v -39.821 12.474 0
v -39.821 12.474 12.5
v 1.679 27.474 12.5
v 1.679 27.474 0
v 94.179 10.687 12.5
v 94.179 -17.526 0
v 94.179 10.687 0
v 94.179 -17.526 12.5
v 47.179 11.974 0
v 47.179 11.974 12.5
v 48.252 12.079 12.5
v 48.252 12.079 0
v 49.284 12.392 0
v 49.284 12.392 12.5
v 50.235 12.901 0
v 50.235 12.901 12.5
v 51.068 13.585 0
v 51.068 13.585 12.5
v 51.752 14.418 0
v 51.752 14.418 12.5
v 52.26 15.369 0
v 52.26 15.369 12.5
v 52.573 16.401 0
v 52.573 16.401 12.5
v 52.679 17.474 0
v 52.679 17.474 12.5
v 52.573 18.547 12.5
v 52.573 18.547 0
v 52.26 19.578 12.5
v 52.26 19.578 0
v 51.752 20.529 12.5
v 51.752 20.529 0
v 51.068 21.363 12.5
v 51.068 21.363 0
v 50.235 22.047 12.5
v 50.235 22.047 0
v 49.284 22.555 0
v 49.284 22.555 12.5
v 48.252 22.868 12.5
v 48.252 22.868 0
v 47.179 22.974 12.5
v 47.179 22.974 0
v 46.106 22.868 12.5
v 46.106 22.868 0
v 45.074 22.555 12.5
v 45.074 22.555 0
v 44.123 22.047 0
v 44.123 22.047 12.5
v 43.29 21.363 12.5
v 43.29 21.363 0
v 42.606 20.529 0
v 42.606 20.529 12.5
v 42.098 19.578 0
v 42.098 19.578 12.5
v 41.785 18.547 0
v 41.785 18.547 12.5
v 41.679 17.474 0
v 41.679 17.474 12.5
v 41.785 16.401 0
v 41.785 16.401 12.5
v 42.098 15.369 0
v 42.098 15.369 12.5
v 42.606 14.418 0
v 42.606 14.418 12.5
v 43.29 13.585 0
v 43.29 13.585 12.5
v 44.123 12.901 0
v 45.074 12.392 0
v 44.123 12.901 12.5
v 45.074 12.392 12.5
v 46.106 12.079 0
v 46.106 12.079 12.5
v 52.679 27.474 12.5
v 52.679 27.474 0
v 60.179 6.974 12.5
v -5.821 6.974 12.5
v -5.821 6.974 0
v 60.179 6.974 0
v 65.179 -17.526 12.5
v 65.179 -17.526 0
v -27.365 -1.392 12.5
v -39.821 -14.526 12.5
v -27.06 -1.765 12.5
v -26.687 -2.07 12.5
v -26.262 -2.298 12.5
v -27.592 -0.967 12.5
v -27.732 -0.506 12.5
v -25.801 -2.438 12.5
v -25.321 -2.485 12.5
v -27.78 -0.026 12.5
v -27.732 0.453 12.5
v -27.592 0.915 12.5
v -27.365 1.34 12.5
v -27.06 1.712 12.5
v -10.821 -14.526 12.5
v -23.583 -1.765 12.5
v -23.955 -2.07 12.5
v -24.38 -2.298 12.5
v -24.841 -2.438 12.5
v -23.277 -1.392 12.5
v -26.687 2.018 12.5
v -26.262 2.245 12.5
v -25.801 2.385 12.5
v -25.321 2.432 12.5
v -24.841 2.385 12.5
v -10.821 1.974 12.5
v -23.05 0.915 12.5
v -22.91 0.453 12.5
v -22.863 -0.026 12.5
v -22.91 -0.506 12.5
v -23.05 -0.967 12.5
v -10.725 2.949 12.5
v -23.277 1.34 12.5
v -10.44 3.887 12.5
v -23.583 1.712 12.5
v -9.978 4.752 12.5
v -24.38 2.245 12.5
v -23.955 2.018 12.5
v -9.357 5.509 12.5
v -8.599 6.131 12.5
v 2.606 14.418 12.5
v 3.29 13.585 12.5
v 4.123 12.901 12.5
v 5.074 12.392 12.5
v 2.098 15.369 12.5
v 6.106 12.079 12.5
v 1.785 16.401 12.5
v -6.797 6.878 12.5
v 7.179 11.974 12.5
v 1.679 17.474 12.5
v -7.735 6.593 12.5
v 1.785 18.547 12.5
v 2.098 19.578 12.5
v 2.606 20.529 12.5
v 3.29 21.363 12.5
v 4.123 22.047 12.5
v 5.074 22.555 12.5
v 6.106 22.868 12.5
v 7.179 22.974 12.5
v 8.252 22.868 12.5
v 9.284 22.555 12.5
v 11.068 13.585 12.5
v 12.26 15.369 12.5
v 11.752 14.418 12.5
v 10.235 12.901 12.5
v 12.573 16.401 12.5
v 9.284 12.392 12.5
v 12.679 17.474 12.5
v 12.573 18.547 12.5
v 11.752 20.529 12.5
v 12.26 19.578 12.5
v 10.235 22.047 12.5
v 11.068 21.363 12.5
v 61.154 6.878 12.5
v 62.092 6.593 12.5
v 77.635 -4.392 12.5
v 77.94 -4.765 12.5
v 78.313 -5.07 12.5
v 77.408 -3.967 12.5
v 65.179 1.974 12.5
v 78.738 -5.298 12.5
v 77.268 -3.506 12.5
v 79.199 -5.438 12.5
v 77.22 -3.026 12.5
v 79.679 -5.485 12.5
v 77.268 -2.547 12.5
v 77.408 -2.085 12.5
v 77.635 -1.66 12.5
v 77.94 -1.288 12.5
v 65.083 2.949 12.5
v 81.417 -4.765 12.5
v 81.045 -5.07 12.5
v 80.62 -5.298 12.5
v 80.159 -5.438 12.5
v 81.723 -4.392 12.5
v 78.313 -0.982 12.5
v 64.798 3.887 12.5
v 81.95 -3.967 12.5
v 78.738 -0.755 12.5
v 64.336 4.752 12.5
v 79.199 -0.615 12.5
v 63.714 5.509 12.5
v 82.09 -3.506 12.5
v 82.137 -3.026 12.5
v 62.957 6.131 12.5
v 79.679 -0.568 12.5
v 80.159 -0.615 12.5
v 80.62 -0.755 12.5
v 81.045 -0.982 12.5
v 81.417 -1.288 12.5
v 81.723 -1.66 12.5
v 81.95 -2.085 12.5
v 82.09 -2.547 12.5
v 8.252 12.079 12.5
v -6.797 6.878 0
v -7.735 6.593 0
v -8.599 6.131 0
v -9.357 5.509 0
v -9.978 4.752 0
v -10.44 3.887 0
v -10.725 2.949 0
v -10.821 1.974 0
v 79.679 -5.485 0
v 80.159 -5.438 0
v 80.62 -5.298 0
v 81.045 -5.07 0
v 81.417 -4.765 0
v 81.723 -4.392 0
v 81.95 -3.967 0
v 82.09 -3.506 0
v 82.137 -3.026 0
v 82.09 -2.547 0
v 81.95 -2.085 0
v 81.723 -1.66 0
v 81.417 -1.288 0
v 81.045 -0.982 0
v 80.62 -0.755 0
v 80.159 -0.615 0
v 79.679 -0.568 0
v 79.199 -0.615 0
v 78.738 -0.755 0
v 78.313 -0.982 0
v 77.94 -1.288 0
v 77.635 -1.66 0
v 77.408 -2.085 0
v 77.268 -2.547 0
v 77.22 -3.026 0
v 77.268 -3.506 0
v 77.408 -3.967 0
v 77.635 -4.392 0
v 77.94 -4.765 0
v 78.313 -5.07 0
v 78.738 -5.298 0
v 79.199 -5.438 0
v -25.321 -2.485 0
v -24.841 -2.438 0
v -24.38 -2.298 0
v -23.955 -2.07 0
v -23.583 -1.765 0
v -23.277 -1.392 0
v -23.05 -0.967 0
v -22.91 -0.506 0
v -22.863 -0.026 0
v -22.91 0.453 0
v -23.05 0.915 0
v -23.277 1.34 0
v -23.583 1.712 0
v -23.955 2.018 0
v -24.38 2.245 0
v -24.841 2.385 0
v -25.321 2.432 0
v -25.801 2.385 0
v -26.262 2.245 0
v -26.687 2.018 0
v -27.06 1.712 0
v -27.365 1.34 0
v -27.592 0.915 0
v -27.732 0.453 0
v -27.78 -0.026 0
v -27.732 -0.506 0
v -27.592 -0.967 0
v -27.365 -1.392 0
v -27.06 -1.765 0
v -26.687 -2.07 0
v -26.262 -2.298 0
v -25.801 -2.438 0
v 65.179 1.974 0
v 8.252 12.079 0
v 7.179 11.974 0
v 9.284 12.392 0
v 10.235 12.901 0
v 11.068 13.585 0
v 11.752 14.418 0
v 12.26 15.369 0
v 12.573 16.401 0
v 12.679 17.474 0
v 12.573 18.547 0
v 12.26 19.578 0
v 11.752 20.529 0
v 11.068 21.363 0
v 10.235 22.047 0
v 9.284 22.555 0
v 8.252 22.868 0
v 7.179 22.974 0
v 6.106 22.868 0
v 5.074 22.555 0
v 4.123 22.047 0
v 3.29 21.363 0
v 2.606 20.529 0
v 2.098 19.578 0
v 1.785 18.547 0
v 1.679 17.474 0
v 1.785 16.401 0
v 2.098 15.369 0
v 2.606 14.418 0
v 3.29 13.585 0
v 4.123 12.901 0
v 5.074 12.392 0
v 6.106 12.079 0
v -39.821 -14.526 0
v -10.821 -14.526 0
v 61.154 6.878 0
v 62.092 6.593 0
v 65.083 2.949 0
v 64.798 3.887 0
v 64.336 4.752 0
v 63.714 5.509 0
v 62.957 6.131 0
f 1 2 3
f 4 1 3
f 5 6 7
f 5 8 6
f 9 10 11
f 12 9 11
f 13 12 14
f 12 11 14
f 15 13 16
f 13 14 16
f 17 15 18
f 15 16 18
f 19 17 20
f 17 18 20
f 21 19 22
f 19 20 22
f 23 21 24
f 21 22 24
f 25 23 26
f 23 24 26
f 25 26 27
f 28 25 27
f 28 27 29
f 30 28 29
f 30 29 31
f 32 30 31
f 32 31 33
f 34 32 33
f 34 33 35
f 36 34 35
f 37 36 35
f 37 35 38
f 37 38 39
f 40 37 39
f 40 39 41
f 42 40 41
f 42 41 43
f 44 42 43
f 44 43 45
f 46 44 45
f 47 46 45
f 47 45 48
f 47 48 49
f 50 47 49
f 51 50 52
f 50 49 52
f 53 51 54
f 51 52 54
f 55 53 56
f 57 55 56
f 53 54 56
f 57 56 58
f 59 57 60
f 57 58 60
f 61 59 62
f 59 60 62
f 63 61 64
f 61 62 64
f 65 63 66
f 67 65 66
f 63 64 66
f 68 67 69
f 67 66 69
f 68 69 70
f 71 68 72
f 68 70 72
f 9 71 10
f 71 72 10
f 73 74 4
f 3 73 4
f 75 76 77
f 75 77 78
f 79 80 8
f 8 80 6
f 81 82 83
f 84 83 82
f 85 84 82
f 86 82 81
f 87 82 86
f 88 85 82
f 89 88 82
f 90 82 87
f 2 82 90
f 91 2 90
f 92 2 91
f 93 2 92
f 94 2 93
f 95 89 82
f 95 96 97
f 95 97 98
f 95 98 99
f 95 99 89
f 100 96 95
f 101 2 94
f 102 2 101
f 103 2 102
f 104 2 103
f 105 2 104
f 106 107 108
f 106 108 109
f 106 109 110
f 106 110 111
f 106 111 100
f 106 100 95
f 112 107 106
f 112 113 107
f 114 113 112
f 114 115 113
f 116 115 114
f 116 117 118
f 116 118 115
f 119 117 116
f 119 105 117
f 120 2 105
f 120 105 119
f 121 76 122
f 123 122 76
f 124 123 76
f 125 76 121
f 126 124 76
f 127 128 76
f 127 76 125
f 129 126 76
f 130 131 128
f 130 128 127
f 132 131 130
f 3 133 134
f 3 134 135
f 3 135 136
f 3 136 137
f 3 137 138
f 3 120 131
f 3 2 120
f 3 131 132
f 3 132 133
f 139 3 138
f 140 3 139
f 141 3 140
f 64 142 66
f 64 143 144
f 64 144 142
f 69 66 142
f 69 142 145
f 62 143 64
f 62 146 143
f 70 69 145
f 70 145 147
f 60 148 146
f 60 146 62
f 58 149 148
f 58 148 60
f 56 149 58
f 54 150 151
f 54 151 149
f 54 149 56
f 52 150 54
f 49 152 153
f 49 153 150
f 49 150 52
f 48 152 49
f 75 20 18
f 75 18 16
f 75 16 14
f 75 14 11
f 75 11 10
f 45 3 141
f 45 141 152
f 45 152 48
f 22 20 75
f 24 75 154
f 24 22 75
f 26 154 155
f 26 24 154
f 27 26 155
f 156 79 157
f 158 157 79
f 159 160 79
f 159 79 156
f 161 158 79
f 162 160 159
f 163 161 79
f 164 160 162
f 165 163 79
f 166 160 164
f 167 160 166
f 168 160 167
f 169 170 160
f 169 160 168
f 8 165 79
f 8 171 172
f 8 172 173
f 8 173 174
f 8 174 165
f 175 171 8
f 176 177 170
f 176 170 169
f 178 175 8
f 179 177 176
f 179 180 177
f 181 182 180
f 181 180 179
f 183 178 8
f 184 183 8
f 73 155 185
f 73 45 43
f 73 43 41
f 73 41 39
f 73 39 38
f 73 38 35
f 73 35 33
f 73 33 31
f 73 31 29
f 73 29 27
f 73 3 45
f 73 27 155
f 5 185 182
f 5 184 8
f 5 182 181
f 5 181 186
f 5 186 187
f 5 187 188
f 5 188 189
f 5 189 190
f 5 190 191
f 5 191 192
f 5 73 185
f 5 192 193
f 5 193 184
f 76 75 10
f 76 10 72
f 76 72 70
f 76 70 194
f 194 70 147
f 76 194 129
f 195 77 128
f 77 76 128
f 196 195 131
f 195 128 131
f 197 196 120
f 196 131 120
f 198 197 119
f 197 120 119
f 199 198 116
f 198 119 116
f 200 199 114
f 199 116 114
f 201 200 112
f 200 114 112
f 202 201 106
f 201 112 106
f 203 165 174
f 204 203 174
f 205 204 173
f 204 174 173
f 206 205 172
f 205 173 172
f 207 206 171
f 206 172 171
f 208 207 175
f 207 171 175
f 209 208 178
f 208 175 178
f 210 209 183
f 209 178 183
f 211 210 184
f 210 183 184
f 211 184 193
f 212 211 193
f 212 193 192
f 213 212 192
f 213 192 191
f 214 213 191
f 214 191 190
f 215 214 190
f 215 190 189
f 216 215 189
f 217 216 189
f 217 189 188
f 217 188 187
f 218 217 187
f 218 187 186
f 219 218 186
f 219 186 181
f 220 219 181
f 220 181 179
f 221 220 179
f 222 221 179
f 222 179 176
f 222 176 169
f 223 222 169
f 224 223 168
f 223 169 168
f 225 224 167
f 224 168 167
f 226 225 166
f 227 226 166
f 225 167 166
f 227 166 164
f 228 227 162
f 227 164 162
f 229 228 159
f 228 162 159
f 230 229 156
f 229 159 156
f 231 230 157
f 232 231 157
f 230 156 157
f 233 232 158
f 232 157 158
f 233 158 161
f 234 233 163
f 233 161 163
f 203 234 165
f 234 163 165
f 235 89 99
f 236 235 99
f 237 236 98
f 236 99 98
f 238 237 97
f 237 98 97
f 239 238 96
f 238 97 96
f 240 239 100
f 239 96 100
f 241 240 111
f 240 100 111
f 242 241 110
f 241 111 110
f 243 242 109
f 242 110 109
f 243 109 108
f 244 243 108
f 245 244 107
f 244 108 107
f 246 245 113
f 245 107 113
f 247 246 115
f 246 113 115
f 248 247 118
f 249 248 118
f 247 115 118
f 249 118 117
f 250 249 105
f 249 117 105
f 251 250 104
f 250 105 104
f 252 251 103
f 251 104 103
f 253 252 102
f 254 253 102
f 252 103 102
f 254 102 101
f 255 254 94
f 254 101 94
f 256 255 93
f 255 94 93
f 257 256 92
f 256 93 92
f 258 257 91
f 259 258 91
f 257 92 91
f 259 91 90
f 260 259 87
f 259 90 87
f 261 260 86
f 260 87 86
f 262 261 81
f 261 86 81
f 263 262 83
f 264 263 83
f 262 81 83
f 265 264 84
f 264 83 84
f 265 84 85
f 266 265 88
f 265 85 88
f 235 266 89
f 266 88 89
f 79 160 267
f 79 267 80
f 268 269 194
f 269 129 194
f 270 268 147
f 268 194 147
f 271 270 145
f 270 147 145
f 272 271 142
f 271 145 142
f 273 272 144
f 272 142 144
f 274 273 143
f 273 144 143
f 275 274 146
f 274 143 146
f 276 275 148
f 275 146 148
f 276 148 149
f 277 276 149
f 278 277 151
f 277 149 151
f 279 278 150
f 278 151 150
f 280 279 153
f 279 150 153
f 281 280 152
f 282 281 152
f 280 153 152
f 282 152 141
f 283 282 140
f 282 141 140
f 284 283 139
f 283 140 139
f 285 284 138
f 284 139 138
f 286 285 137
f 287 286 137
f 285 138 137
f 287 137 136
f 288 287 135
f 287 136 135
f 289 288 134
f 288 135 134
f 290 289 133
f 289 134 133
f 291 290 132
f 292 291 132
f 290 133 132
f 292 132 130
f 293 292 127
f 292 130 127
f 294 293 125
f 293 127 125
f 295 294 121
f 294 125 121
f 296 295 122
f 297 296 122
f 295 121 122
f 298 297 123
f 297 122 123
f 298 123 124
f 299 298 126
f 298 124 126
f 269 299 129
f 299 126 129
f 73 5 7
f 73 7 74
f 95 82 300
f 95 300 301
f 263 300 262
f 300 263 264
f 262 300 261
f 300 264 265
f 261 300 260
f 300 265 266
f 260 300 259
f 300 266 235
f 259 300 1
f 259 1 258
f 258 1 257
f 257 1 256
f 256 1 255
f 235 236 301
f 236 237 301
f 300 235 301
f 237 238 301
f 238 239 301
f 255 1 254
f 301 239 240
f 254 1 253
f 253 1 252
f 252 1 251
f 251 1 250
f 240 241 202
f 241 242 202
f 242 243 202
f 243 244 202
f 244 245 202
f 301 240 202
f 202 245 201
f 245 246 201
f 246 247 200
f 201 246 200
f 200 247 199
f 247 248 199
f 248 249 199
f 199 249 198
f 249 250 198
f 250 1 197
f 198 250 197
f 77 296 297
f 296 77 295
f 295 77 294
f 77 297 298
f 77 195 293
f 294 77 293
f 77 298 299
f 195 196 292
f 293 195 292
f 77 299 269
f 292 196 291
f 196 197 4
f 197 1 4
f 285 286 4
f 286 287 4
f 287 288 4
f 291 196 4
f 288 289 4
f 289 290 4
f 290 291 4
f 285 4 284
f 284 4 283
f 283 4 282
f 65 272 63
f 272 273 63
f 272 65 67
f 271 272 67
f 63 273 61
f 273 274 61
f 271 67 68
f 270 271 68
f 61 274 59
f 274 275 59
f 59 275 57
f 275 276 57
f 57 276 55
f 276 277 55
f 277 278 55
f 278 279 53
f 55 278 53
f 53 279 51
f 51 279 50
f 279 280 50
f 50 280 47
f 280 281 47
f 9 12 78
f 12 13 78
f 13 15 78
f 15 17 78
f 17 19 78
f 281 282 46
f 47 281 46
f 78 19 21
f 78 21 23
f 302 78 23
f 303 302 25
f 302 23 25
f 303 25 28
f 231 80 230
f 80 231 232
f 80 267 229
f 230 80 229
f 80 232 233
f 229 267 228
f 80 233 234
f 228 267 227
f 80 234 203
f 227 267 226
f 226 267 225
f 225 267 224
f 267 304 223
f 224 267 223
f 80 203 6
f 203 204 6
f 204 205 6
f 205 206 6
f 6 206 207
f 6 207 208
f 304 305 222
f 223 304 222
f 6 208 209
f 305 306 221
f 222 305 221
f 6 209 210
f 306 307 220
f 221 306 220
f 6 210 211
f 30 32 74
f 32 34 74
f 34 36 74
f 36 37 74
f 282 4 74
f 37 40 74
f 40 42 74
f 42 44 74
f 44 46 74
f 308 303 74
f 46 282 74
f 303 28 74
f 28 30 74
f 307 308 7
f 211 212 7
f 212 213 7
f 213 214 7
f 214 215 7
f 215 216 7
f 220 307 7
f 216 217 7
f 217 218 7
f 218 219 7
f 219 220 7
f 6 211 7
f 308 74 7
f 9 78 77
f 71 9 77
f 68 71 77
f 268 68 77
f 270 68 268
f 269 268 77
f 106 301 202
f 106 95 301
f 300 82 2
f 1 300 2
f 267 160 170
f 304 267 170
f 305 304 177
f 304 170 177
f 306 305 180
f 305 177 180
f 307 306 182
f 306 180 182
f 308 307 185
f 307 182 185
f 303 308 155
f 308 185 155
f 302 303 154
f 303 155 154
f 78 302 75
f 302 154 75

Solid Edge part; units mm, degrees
sketch "Sketch1" plane through (0, 0, 0) normal (0, 0, 1) x (1, 0, 0)
  line L0 (-42.8211, -17.5263) -> (97.1789, -17.5263)
  line L1 (97.1789, -17.5263) -> (97.1789, 27.4737)
  line L2 (97.1789, 27.4737) -> (-42.8211, 27.4737)
  line L3 (-42.8211, 27.4737) -> (-42.8211, -17.5263)
  dimension "D1" = 140
  dimension "D2" = 45
extrude "Protrusion1" add sketch "Sketch1" along normal blind 12.5
hole "Hole_1" at (47.1789, 17.4737, 12.5) direction (0, 0, -1) diameter 11 end through all
hole "Hole1" at (7.1789, 17.4737, 12.5) direction (0, 0, -1) diameter 11 end through all
hole "Hole_3" at (79.6789, -3.0263, 12.5) direction (0, 0, -1) diameter 4.917 end through all
hole "Hole2" at (-25.3211, -0.0263, 12.5) direction (0, 0, -1) diameter 4.917 end through all
sketch "Sketch2" plane through (27.1789, 4.9737, 12.5) normal (0, 0, 1) x (1, 0, 0)
  line L0 (-38, -22.5) -> (-38, -3)
  arc A0 (-38, -3) -> (-33, 2) centre (-33, -3) cw
  line L1 (-33, 2) -> (33, 2)
  arc A1 (33, 2) -> (38, -3) centre (33, -3) cw
  line L2 (38, -3) -> (38, -22.5)
  line L3 (-38, -22.5) -> (38, -22.5)
  line L4 (25.5, 22.5) -> (70, 22.5)
  line L5 (70, 22.5) -> (70, 4.5)
  line L6 (70, 4.5) -> (25.5, 22.5)
  line L7 (-70, 22.5) -> (-25.5, 22.5)
  line L8 (-25.5, 22.5) -> (-70, 7.5)
  line L9 (-70, 7.5) -> (-70, 22.5)
  dimension "D1" = 5
  dimension "D2" = 2
  dimension "D3" = 2
  dimension "D4" = 5
  dimension "D5" = 5
extrude "Cutout1" cut sketch "Sketch2" against normal through all
sketch "Sketch3" plane through (27.1789, 4.9737, 12.5) normal (0, 0, 1) x (1, 0, 0)
  line L0 (-35, -19.5) -> (-35, -22.5)
  line L1 (-35, -22.5) -> (-75.0244, -22.5)
  line L2 (-75.0244, -22.5) -> (-75.0244, -19.5)
  line L3 (-75.0244, -19.5) -> (-35, -19.5)
  line L4 (70, -22.5) -> (67, -22.5)
  line L5 (67, -22.5) -> (67, 21.0516)
  line L6 (67, 21.0516) -> (70, 21.0516)
  line L7 (70, 21.0516) -> (70, -22.5)
  line L8 (-70, -22.5) -> (-67, -22.5)
  line L9 (-67, -22.5) -> (-67, 20.7963)
  line L10 (-67, 20.7963) -> (-70, 20.7963)
  line L11 (-70, 20.7963) -> (-70, -22.5)
  dimension "D1" = 2
  dimension "D2" = 2
  dimension "D3" = 43.5516
  dimension "D4" = 2
extrude "Cutout2" cut sketch "Sketch3" against normal through all
sketch "Sketch4" plane through (27.1789, 4.9737, 12.5) normal (0, 0, 1) x (1, 0, 0)
  line L0 (-67, 7.5) -> (-25.5, 22.5)
  line L1 (-25.5, 22.5) -> (-67, 8.5112)
  line L2 (-67, 8.5112) -> (-67, 7.5)
extrude "Cutout3" cut sketch "Sketch4" against normal through all
properties material "Aluminum, 6061-T6"
